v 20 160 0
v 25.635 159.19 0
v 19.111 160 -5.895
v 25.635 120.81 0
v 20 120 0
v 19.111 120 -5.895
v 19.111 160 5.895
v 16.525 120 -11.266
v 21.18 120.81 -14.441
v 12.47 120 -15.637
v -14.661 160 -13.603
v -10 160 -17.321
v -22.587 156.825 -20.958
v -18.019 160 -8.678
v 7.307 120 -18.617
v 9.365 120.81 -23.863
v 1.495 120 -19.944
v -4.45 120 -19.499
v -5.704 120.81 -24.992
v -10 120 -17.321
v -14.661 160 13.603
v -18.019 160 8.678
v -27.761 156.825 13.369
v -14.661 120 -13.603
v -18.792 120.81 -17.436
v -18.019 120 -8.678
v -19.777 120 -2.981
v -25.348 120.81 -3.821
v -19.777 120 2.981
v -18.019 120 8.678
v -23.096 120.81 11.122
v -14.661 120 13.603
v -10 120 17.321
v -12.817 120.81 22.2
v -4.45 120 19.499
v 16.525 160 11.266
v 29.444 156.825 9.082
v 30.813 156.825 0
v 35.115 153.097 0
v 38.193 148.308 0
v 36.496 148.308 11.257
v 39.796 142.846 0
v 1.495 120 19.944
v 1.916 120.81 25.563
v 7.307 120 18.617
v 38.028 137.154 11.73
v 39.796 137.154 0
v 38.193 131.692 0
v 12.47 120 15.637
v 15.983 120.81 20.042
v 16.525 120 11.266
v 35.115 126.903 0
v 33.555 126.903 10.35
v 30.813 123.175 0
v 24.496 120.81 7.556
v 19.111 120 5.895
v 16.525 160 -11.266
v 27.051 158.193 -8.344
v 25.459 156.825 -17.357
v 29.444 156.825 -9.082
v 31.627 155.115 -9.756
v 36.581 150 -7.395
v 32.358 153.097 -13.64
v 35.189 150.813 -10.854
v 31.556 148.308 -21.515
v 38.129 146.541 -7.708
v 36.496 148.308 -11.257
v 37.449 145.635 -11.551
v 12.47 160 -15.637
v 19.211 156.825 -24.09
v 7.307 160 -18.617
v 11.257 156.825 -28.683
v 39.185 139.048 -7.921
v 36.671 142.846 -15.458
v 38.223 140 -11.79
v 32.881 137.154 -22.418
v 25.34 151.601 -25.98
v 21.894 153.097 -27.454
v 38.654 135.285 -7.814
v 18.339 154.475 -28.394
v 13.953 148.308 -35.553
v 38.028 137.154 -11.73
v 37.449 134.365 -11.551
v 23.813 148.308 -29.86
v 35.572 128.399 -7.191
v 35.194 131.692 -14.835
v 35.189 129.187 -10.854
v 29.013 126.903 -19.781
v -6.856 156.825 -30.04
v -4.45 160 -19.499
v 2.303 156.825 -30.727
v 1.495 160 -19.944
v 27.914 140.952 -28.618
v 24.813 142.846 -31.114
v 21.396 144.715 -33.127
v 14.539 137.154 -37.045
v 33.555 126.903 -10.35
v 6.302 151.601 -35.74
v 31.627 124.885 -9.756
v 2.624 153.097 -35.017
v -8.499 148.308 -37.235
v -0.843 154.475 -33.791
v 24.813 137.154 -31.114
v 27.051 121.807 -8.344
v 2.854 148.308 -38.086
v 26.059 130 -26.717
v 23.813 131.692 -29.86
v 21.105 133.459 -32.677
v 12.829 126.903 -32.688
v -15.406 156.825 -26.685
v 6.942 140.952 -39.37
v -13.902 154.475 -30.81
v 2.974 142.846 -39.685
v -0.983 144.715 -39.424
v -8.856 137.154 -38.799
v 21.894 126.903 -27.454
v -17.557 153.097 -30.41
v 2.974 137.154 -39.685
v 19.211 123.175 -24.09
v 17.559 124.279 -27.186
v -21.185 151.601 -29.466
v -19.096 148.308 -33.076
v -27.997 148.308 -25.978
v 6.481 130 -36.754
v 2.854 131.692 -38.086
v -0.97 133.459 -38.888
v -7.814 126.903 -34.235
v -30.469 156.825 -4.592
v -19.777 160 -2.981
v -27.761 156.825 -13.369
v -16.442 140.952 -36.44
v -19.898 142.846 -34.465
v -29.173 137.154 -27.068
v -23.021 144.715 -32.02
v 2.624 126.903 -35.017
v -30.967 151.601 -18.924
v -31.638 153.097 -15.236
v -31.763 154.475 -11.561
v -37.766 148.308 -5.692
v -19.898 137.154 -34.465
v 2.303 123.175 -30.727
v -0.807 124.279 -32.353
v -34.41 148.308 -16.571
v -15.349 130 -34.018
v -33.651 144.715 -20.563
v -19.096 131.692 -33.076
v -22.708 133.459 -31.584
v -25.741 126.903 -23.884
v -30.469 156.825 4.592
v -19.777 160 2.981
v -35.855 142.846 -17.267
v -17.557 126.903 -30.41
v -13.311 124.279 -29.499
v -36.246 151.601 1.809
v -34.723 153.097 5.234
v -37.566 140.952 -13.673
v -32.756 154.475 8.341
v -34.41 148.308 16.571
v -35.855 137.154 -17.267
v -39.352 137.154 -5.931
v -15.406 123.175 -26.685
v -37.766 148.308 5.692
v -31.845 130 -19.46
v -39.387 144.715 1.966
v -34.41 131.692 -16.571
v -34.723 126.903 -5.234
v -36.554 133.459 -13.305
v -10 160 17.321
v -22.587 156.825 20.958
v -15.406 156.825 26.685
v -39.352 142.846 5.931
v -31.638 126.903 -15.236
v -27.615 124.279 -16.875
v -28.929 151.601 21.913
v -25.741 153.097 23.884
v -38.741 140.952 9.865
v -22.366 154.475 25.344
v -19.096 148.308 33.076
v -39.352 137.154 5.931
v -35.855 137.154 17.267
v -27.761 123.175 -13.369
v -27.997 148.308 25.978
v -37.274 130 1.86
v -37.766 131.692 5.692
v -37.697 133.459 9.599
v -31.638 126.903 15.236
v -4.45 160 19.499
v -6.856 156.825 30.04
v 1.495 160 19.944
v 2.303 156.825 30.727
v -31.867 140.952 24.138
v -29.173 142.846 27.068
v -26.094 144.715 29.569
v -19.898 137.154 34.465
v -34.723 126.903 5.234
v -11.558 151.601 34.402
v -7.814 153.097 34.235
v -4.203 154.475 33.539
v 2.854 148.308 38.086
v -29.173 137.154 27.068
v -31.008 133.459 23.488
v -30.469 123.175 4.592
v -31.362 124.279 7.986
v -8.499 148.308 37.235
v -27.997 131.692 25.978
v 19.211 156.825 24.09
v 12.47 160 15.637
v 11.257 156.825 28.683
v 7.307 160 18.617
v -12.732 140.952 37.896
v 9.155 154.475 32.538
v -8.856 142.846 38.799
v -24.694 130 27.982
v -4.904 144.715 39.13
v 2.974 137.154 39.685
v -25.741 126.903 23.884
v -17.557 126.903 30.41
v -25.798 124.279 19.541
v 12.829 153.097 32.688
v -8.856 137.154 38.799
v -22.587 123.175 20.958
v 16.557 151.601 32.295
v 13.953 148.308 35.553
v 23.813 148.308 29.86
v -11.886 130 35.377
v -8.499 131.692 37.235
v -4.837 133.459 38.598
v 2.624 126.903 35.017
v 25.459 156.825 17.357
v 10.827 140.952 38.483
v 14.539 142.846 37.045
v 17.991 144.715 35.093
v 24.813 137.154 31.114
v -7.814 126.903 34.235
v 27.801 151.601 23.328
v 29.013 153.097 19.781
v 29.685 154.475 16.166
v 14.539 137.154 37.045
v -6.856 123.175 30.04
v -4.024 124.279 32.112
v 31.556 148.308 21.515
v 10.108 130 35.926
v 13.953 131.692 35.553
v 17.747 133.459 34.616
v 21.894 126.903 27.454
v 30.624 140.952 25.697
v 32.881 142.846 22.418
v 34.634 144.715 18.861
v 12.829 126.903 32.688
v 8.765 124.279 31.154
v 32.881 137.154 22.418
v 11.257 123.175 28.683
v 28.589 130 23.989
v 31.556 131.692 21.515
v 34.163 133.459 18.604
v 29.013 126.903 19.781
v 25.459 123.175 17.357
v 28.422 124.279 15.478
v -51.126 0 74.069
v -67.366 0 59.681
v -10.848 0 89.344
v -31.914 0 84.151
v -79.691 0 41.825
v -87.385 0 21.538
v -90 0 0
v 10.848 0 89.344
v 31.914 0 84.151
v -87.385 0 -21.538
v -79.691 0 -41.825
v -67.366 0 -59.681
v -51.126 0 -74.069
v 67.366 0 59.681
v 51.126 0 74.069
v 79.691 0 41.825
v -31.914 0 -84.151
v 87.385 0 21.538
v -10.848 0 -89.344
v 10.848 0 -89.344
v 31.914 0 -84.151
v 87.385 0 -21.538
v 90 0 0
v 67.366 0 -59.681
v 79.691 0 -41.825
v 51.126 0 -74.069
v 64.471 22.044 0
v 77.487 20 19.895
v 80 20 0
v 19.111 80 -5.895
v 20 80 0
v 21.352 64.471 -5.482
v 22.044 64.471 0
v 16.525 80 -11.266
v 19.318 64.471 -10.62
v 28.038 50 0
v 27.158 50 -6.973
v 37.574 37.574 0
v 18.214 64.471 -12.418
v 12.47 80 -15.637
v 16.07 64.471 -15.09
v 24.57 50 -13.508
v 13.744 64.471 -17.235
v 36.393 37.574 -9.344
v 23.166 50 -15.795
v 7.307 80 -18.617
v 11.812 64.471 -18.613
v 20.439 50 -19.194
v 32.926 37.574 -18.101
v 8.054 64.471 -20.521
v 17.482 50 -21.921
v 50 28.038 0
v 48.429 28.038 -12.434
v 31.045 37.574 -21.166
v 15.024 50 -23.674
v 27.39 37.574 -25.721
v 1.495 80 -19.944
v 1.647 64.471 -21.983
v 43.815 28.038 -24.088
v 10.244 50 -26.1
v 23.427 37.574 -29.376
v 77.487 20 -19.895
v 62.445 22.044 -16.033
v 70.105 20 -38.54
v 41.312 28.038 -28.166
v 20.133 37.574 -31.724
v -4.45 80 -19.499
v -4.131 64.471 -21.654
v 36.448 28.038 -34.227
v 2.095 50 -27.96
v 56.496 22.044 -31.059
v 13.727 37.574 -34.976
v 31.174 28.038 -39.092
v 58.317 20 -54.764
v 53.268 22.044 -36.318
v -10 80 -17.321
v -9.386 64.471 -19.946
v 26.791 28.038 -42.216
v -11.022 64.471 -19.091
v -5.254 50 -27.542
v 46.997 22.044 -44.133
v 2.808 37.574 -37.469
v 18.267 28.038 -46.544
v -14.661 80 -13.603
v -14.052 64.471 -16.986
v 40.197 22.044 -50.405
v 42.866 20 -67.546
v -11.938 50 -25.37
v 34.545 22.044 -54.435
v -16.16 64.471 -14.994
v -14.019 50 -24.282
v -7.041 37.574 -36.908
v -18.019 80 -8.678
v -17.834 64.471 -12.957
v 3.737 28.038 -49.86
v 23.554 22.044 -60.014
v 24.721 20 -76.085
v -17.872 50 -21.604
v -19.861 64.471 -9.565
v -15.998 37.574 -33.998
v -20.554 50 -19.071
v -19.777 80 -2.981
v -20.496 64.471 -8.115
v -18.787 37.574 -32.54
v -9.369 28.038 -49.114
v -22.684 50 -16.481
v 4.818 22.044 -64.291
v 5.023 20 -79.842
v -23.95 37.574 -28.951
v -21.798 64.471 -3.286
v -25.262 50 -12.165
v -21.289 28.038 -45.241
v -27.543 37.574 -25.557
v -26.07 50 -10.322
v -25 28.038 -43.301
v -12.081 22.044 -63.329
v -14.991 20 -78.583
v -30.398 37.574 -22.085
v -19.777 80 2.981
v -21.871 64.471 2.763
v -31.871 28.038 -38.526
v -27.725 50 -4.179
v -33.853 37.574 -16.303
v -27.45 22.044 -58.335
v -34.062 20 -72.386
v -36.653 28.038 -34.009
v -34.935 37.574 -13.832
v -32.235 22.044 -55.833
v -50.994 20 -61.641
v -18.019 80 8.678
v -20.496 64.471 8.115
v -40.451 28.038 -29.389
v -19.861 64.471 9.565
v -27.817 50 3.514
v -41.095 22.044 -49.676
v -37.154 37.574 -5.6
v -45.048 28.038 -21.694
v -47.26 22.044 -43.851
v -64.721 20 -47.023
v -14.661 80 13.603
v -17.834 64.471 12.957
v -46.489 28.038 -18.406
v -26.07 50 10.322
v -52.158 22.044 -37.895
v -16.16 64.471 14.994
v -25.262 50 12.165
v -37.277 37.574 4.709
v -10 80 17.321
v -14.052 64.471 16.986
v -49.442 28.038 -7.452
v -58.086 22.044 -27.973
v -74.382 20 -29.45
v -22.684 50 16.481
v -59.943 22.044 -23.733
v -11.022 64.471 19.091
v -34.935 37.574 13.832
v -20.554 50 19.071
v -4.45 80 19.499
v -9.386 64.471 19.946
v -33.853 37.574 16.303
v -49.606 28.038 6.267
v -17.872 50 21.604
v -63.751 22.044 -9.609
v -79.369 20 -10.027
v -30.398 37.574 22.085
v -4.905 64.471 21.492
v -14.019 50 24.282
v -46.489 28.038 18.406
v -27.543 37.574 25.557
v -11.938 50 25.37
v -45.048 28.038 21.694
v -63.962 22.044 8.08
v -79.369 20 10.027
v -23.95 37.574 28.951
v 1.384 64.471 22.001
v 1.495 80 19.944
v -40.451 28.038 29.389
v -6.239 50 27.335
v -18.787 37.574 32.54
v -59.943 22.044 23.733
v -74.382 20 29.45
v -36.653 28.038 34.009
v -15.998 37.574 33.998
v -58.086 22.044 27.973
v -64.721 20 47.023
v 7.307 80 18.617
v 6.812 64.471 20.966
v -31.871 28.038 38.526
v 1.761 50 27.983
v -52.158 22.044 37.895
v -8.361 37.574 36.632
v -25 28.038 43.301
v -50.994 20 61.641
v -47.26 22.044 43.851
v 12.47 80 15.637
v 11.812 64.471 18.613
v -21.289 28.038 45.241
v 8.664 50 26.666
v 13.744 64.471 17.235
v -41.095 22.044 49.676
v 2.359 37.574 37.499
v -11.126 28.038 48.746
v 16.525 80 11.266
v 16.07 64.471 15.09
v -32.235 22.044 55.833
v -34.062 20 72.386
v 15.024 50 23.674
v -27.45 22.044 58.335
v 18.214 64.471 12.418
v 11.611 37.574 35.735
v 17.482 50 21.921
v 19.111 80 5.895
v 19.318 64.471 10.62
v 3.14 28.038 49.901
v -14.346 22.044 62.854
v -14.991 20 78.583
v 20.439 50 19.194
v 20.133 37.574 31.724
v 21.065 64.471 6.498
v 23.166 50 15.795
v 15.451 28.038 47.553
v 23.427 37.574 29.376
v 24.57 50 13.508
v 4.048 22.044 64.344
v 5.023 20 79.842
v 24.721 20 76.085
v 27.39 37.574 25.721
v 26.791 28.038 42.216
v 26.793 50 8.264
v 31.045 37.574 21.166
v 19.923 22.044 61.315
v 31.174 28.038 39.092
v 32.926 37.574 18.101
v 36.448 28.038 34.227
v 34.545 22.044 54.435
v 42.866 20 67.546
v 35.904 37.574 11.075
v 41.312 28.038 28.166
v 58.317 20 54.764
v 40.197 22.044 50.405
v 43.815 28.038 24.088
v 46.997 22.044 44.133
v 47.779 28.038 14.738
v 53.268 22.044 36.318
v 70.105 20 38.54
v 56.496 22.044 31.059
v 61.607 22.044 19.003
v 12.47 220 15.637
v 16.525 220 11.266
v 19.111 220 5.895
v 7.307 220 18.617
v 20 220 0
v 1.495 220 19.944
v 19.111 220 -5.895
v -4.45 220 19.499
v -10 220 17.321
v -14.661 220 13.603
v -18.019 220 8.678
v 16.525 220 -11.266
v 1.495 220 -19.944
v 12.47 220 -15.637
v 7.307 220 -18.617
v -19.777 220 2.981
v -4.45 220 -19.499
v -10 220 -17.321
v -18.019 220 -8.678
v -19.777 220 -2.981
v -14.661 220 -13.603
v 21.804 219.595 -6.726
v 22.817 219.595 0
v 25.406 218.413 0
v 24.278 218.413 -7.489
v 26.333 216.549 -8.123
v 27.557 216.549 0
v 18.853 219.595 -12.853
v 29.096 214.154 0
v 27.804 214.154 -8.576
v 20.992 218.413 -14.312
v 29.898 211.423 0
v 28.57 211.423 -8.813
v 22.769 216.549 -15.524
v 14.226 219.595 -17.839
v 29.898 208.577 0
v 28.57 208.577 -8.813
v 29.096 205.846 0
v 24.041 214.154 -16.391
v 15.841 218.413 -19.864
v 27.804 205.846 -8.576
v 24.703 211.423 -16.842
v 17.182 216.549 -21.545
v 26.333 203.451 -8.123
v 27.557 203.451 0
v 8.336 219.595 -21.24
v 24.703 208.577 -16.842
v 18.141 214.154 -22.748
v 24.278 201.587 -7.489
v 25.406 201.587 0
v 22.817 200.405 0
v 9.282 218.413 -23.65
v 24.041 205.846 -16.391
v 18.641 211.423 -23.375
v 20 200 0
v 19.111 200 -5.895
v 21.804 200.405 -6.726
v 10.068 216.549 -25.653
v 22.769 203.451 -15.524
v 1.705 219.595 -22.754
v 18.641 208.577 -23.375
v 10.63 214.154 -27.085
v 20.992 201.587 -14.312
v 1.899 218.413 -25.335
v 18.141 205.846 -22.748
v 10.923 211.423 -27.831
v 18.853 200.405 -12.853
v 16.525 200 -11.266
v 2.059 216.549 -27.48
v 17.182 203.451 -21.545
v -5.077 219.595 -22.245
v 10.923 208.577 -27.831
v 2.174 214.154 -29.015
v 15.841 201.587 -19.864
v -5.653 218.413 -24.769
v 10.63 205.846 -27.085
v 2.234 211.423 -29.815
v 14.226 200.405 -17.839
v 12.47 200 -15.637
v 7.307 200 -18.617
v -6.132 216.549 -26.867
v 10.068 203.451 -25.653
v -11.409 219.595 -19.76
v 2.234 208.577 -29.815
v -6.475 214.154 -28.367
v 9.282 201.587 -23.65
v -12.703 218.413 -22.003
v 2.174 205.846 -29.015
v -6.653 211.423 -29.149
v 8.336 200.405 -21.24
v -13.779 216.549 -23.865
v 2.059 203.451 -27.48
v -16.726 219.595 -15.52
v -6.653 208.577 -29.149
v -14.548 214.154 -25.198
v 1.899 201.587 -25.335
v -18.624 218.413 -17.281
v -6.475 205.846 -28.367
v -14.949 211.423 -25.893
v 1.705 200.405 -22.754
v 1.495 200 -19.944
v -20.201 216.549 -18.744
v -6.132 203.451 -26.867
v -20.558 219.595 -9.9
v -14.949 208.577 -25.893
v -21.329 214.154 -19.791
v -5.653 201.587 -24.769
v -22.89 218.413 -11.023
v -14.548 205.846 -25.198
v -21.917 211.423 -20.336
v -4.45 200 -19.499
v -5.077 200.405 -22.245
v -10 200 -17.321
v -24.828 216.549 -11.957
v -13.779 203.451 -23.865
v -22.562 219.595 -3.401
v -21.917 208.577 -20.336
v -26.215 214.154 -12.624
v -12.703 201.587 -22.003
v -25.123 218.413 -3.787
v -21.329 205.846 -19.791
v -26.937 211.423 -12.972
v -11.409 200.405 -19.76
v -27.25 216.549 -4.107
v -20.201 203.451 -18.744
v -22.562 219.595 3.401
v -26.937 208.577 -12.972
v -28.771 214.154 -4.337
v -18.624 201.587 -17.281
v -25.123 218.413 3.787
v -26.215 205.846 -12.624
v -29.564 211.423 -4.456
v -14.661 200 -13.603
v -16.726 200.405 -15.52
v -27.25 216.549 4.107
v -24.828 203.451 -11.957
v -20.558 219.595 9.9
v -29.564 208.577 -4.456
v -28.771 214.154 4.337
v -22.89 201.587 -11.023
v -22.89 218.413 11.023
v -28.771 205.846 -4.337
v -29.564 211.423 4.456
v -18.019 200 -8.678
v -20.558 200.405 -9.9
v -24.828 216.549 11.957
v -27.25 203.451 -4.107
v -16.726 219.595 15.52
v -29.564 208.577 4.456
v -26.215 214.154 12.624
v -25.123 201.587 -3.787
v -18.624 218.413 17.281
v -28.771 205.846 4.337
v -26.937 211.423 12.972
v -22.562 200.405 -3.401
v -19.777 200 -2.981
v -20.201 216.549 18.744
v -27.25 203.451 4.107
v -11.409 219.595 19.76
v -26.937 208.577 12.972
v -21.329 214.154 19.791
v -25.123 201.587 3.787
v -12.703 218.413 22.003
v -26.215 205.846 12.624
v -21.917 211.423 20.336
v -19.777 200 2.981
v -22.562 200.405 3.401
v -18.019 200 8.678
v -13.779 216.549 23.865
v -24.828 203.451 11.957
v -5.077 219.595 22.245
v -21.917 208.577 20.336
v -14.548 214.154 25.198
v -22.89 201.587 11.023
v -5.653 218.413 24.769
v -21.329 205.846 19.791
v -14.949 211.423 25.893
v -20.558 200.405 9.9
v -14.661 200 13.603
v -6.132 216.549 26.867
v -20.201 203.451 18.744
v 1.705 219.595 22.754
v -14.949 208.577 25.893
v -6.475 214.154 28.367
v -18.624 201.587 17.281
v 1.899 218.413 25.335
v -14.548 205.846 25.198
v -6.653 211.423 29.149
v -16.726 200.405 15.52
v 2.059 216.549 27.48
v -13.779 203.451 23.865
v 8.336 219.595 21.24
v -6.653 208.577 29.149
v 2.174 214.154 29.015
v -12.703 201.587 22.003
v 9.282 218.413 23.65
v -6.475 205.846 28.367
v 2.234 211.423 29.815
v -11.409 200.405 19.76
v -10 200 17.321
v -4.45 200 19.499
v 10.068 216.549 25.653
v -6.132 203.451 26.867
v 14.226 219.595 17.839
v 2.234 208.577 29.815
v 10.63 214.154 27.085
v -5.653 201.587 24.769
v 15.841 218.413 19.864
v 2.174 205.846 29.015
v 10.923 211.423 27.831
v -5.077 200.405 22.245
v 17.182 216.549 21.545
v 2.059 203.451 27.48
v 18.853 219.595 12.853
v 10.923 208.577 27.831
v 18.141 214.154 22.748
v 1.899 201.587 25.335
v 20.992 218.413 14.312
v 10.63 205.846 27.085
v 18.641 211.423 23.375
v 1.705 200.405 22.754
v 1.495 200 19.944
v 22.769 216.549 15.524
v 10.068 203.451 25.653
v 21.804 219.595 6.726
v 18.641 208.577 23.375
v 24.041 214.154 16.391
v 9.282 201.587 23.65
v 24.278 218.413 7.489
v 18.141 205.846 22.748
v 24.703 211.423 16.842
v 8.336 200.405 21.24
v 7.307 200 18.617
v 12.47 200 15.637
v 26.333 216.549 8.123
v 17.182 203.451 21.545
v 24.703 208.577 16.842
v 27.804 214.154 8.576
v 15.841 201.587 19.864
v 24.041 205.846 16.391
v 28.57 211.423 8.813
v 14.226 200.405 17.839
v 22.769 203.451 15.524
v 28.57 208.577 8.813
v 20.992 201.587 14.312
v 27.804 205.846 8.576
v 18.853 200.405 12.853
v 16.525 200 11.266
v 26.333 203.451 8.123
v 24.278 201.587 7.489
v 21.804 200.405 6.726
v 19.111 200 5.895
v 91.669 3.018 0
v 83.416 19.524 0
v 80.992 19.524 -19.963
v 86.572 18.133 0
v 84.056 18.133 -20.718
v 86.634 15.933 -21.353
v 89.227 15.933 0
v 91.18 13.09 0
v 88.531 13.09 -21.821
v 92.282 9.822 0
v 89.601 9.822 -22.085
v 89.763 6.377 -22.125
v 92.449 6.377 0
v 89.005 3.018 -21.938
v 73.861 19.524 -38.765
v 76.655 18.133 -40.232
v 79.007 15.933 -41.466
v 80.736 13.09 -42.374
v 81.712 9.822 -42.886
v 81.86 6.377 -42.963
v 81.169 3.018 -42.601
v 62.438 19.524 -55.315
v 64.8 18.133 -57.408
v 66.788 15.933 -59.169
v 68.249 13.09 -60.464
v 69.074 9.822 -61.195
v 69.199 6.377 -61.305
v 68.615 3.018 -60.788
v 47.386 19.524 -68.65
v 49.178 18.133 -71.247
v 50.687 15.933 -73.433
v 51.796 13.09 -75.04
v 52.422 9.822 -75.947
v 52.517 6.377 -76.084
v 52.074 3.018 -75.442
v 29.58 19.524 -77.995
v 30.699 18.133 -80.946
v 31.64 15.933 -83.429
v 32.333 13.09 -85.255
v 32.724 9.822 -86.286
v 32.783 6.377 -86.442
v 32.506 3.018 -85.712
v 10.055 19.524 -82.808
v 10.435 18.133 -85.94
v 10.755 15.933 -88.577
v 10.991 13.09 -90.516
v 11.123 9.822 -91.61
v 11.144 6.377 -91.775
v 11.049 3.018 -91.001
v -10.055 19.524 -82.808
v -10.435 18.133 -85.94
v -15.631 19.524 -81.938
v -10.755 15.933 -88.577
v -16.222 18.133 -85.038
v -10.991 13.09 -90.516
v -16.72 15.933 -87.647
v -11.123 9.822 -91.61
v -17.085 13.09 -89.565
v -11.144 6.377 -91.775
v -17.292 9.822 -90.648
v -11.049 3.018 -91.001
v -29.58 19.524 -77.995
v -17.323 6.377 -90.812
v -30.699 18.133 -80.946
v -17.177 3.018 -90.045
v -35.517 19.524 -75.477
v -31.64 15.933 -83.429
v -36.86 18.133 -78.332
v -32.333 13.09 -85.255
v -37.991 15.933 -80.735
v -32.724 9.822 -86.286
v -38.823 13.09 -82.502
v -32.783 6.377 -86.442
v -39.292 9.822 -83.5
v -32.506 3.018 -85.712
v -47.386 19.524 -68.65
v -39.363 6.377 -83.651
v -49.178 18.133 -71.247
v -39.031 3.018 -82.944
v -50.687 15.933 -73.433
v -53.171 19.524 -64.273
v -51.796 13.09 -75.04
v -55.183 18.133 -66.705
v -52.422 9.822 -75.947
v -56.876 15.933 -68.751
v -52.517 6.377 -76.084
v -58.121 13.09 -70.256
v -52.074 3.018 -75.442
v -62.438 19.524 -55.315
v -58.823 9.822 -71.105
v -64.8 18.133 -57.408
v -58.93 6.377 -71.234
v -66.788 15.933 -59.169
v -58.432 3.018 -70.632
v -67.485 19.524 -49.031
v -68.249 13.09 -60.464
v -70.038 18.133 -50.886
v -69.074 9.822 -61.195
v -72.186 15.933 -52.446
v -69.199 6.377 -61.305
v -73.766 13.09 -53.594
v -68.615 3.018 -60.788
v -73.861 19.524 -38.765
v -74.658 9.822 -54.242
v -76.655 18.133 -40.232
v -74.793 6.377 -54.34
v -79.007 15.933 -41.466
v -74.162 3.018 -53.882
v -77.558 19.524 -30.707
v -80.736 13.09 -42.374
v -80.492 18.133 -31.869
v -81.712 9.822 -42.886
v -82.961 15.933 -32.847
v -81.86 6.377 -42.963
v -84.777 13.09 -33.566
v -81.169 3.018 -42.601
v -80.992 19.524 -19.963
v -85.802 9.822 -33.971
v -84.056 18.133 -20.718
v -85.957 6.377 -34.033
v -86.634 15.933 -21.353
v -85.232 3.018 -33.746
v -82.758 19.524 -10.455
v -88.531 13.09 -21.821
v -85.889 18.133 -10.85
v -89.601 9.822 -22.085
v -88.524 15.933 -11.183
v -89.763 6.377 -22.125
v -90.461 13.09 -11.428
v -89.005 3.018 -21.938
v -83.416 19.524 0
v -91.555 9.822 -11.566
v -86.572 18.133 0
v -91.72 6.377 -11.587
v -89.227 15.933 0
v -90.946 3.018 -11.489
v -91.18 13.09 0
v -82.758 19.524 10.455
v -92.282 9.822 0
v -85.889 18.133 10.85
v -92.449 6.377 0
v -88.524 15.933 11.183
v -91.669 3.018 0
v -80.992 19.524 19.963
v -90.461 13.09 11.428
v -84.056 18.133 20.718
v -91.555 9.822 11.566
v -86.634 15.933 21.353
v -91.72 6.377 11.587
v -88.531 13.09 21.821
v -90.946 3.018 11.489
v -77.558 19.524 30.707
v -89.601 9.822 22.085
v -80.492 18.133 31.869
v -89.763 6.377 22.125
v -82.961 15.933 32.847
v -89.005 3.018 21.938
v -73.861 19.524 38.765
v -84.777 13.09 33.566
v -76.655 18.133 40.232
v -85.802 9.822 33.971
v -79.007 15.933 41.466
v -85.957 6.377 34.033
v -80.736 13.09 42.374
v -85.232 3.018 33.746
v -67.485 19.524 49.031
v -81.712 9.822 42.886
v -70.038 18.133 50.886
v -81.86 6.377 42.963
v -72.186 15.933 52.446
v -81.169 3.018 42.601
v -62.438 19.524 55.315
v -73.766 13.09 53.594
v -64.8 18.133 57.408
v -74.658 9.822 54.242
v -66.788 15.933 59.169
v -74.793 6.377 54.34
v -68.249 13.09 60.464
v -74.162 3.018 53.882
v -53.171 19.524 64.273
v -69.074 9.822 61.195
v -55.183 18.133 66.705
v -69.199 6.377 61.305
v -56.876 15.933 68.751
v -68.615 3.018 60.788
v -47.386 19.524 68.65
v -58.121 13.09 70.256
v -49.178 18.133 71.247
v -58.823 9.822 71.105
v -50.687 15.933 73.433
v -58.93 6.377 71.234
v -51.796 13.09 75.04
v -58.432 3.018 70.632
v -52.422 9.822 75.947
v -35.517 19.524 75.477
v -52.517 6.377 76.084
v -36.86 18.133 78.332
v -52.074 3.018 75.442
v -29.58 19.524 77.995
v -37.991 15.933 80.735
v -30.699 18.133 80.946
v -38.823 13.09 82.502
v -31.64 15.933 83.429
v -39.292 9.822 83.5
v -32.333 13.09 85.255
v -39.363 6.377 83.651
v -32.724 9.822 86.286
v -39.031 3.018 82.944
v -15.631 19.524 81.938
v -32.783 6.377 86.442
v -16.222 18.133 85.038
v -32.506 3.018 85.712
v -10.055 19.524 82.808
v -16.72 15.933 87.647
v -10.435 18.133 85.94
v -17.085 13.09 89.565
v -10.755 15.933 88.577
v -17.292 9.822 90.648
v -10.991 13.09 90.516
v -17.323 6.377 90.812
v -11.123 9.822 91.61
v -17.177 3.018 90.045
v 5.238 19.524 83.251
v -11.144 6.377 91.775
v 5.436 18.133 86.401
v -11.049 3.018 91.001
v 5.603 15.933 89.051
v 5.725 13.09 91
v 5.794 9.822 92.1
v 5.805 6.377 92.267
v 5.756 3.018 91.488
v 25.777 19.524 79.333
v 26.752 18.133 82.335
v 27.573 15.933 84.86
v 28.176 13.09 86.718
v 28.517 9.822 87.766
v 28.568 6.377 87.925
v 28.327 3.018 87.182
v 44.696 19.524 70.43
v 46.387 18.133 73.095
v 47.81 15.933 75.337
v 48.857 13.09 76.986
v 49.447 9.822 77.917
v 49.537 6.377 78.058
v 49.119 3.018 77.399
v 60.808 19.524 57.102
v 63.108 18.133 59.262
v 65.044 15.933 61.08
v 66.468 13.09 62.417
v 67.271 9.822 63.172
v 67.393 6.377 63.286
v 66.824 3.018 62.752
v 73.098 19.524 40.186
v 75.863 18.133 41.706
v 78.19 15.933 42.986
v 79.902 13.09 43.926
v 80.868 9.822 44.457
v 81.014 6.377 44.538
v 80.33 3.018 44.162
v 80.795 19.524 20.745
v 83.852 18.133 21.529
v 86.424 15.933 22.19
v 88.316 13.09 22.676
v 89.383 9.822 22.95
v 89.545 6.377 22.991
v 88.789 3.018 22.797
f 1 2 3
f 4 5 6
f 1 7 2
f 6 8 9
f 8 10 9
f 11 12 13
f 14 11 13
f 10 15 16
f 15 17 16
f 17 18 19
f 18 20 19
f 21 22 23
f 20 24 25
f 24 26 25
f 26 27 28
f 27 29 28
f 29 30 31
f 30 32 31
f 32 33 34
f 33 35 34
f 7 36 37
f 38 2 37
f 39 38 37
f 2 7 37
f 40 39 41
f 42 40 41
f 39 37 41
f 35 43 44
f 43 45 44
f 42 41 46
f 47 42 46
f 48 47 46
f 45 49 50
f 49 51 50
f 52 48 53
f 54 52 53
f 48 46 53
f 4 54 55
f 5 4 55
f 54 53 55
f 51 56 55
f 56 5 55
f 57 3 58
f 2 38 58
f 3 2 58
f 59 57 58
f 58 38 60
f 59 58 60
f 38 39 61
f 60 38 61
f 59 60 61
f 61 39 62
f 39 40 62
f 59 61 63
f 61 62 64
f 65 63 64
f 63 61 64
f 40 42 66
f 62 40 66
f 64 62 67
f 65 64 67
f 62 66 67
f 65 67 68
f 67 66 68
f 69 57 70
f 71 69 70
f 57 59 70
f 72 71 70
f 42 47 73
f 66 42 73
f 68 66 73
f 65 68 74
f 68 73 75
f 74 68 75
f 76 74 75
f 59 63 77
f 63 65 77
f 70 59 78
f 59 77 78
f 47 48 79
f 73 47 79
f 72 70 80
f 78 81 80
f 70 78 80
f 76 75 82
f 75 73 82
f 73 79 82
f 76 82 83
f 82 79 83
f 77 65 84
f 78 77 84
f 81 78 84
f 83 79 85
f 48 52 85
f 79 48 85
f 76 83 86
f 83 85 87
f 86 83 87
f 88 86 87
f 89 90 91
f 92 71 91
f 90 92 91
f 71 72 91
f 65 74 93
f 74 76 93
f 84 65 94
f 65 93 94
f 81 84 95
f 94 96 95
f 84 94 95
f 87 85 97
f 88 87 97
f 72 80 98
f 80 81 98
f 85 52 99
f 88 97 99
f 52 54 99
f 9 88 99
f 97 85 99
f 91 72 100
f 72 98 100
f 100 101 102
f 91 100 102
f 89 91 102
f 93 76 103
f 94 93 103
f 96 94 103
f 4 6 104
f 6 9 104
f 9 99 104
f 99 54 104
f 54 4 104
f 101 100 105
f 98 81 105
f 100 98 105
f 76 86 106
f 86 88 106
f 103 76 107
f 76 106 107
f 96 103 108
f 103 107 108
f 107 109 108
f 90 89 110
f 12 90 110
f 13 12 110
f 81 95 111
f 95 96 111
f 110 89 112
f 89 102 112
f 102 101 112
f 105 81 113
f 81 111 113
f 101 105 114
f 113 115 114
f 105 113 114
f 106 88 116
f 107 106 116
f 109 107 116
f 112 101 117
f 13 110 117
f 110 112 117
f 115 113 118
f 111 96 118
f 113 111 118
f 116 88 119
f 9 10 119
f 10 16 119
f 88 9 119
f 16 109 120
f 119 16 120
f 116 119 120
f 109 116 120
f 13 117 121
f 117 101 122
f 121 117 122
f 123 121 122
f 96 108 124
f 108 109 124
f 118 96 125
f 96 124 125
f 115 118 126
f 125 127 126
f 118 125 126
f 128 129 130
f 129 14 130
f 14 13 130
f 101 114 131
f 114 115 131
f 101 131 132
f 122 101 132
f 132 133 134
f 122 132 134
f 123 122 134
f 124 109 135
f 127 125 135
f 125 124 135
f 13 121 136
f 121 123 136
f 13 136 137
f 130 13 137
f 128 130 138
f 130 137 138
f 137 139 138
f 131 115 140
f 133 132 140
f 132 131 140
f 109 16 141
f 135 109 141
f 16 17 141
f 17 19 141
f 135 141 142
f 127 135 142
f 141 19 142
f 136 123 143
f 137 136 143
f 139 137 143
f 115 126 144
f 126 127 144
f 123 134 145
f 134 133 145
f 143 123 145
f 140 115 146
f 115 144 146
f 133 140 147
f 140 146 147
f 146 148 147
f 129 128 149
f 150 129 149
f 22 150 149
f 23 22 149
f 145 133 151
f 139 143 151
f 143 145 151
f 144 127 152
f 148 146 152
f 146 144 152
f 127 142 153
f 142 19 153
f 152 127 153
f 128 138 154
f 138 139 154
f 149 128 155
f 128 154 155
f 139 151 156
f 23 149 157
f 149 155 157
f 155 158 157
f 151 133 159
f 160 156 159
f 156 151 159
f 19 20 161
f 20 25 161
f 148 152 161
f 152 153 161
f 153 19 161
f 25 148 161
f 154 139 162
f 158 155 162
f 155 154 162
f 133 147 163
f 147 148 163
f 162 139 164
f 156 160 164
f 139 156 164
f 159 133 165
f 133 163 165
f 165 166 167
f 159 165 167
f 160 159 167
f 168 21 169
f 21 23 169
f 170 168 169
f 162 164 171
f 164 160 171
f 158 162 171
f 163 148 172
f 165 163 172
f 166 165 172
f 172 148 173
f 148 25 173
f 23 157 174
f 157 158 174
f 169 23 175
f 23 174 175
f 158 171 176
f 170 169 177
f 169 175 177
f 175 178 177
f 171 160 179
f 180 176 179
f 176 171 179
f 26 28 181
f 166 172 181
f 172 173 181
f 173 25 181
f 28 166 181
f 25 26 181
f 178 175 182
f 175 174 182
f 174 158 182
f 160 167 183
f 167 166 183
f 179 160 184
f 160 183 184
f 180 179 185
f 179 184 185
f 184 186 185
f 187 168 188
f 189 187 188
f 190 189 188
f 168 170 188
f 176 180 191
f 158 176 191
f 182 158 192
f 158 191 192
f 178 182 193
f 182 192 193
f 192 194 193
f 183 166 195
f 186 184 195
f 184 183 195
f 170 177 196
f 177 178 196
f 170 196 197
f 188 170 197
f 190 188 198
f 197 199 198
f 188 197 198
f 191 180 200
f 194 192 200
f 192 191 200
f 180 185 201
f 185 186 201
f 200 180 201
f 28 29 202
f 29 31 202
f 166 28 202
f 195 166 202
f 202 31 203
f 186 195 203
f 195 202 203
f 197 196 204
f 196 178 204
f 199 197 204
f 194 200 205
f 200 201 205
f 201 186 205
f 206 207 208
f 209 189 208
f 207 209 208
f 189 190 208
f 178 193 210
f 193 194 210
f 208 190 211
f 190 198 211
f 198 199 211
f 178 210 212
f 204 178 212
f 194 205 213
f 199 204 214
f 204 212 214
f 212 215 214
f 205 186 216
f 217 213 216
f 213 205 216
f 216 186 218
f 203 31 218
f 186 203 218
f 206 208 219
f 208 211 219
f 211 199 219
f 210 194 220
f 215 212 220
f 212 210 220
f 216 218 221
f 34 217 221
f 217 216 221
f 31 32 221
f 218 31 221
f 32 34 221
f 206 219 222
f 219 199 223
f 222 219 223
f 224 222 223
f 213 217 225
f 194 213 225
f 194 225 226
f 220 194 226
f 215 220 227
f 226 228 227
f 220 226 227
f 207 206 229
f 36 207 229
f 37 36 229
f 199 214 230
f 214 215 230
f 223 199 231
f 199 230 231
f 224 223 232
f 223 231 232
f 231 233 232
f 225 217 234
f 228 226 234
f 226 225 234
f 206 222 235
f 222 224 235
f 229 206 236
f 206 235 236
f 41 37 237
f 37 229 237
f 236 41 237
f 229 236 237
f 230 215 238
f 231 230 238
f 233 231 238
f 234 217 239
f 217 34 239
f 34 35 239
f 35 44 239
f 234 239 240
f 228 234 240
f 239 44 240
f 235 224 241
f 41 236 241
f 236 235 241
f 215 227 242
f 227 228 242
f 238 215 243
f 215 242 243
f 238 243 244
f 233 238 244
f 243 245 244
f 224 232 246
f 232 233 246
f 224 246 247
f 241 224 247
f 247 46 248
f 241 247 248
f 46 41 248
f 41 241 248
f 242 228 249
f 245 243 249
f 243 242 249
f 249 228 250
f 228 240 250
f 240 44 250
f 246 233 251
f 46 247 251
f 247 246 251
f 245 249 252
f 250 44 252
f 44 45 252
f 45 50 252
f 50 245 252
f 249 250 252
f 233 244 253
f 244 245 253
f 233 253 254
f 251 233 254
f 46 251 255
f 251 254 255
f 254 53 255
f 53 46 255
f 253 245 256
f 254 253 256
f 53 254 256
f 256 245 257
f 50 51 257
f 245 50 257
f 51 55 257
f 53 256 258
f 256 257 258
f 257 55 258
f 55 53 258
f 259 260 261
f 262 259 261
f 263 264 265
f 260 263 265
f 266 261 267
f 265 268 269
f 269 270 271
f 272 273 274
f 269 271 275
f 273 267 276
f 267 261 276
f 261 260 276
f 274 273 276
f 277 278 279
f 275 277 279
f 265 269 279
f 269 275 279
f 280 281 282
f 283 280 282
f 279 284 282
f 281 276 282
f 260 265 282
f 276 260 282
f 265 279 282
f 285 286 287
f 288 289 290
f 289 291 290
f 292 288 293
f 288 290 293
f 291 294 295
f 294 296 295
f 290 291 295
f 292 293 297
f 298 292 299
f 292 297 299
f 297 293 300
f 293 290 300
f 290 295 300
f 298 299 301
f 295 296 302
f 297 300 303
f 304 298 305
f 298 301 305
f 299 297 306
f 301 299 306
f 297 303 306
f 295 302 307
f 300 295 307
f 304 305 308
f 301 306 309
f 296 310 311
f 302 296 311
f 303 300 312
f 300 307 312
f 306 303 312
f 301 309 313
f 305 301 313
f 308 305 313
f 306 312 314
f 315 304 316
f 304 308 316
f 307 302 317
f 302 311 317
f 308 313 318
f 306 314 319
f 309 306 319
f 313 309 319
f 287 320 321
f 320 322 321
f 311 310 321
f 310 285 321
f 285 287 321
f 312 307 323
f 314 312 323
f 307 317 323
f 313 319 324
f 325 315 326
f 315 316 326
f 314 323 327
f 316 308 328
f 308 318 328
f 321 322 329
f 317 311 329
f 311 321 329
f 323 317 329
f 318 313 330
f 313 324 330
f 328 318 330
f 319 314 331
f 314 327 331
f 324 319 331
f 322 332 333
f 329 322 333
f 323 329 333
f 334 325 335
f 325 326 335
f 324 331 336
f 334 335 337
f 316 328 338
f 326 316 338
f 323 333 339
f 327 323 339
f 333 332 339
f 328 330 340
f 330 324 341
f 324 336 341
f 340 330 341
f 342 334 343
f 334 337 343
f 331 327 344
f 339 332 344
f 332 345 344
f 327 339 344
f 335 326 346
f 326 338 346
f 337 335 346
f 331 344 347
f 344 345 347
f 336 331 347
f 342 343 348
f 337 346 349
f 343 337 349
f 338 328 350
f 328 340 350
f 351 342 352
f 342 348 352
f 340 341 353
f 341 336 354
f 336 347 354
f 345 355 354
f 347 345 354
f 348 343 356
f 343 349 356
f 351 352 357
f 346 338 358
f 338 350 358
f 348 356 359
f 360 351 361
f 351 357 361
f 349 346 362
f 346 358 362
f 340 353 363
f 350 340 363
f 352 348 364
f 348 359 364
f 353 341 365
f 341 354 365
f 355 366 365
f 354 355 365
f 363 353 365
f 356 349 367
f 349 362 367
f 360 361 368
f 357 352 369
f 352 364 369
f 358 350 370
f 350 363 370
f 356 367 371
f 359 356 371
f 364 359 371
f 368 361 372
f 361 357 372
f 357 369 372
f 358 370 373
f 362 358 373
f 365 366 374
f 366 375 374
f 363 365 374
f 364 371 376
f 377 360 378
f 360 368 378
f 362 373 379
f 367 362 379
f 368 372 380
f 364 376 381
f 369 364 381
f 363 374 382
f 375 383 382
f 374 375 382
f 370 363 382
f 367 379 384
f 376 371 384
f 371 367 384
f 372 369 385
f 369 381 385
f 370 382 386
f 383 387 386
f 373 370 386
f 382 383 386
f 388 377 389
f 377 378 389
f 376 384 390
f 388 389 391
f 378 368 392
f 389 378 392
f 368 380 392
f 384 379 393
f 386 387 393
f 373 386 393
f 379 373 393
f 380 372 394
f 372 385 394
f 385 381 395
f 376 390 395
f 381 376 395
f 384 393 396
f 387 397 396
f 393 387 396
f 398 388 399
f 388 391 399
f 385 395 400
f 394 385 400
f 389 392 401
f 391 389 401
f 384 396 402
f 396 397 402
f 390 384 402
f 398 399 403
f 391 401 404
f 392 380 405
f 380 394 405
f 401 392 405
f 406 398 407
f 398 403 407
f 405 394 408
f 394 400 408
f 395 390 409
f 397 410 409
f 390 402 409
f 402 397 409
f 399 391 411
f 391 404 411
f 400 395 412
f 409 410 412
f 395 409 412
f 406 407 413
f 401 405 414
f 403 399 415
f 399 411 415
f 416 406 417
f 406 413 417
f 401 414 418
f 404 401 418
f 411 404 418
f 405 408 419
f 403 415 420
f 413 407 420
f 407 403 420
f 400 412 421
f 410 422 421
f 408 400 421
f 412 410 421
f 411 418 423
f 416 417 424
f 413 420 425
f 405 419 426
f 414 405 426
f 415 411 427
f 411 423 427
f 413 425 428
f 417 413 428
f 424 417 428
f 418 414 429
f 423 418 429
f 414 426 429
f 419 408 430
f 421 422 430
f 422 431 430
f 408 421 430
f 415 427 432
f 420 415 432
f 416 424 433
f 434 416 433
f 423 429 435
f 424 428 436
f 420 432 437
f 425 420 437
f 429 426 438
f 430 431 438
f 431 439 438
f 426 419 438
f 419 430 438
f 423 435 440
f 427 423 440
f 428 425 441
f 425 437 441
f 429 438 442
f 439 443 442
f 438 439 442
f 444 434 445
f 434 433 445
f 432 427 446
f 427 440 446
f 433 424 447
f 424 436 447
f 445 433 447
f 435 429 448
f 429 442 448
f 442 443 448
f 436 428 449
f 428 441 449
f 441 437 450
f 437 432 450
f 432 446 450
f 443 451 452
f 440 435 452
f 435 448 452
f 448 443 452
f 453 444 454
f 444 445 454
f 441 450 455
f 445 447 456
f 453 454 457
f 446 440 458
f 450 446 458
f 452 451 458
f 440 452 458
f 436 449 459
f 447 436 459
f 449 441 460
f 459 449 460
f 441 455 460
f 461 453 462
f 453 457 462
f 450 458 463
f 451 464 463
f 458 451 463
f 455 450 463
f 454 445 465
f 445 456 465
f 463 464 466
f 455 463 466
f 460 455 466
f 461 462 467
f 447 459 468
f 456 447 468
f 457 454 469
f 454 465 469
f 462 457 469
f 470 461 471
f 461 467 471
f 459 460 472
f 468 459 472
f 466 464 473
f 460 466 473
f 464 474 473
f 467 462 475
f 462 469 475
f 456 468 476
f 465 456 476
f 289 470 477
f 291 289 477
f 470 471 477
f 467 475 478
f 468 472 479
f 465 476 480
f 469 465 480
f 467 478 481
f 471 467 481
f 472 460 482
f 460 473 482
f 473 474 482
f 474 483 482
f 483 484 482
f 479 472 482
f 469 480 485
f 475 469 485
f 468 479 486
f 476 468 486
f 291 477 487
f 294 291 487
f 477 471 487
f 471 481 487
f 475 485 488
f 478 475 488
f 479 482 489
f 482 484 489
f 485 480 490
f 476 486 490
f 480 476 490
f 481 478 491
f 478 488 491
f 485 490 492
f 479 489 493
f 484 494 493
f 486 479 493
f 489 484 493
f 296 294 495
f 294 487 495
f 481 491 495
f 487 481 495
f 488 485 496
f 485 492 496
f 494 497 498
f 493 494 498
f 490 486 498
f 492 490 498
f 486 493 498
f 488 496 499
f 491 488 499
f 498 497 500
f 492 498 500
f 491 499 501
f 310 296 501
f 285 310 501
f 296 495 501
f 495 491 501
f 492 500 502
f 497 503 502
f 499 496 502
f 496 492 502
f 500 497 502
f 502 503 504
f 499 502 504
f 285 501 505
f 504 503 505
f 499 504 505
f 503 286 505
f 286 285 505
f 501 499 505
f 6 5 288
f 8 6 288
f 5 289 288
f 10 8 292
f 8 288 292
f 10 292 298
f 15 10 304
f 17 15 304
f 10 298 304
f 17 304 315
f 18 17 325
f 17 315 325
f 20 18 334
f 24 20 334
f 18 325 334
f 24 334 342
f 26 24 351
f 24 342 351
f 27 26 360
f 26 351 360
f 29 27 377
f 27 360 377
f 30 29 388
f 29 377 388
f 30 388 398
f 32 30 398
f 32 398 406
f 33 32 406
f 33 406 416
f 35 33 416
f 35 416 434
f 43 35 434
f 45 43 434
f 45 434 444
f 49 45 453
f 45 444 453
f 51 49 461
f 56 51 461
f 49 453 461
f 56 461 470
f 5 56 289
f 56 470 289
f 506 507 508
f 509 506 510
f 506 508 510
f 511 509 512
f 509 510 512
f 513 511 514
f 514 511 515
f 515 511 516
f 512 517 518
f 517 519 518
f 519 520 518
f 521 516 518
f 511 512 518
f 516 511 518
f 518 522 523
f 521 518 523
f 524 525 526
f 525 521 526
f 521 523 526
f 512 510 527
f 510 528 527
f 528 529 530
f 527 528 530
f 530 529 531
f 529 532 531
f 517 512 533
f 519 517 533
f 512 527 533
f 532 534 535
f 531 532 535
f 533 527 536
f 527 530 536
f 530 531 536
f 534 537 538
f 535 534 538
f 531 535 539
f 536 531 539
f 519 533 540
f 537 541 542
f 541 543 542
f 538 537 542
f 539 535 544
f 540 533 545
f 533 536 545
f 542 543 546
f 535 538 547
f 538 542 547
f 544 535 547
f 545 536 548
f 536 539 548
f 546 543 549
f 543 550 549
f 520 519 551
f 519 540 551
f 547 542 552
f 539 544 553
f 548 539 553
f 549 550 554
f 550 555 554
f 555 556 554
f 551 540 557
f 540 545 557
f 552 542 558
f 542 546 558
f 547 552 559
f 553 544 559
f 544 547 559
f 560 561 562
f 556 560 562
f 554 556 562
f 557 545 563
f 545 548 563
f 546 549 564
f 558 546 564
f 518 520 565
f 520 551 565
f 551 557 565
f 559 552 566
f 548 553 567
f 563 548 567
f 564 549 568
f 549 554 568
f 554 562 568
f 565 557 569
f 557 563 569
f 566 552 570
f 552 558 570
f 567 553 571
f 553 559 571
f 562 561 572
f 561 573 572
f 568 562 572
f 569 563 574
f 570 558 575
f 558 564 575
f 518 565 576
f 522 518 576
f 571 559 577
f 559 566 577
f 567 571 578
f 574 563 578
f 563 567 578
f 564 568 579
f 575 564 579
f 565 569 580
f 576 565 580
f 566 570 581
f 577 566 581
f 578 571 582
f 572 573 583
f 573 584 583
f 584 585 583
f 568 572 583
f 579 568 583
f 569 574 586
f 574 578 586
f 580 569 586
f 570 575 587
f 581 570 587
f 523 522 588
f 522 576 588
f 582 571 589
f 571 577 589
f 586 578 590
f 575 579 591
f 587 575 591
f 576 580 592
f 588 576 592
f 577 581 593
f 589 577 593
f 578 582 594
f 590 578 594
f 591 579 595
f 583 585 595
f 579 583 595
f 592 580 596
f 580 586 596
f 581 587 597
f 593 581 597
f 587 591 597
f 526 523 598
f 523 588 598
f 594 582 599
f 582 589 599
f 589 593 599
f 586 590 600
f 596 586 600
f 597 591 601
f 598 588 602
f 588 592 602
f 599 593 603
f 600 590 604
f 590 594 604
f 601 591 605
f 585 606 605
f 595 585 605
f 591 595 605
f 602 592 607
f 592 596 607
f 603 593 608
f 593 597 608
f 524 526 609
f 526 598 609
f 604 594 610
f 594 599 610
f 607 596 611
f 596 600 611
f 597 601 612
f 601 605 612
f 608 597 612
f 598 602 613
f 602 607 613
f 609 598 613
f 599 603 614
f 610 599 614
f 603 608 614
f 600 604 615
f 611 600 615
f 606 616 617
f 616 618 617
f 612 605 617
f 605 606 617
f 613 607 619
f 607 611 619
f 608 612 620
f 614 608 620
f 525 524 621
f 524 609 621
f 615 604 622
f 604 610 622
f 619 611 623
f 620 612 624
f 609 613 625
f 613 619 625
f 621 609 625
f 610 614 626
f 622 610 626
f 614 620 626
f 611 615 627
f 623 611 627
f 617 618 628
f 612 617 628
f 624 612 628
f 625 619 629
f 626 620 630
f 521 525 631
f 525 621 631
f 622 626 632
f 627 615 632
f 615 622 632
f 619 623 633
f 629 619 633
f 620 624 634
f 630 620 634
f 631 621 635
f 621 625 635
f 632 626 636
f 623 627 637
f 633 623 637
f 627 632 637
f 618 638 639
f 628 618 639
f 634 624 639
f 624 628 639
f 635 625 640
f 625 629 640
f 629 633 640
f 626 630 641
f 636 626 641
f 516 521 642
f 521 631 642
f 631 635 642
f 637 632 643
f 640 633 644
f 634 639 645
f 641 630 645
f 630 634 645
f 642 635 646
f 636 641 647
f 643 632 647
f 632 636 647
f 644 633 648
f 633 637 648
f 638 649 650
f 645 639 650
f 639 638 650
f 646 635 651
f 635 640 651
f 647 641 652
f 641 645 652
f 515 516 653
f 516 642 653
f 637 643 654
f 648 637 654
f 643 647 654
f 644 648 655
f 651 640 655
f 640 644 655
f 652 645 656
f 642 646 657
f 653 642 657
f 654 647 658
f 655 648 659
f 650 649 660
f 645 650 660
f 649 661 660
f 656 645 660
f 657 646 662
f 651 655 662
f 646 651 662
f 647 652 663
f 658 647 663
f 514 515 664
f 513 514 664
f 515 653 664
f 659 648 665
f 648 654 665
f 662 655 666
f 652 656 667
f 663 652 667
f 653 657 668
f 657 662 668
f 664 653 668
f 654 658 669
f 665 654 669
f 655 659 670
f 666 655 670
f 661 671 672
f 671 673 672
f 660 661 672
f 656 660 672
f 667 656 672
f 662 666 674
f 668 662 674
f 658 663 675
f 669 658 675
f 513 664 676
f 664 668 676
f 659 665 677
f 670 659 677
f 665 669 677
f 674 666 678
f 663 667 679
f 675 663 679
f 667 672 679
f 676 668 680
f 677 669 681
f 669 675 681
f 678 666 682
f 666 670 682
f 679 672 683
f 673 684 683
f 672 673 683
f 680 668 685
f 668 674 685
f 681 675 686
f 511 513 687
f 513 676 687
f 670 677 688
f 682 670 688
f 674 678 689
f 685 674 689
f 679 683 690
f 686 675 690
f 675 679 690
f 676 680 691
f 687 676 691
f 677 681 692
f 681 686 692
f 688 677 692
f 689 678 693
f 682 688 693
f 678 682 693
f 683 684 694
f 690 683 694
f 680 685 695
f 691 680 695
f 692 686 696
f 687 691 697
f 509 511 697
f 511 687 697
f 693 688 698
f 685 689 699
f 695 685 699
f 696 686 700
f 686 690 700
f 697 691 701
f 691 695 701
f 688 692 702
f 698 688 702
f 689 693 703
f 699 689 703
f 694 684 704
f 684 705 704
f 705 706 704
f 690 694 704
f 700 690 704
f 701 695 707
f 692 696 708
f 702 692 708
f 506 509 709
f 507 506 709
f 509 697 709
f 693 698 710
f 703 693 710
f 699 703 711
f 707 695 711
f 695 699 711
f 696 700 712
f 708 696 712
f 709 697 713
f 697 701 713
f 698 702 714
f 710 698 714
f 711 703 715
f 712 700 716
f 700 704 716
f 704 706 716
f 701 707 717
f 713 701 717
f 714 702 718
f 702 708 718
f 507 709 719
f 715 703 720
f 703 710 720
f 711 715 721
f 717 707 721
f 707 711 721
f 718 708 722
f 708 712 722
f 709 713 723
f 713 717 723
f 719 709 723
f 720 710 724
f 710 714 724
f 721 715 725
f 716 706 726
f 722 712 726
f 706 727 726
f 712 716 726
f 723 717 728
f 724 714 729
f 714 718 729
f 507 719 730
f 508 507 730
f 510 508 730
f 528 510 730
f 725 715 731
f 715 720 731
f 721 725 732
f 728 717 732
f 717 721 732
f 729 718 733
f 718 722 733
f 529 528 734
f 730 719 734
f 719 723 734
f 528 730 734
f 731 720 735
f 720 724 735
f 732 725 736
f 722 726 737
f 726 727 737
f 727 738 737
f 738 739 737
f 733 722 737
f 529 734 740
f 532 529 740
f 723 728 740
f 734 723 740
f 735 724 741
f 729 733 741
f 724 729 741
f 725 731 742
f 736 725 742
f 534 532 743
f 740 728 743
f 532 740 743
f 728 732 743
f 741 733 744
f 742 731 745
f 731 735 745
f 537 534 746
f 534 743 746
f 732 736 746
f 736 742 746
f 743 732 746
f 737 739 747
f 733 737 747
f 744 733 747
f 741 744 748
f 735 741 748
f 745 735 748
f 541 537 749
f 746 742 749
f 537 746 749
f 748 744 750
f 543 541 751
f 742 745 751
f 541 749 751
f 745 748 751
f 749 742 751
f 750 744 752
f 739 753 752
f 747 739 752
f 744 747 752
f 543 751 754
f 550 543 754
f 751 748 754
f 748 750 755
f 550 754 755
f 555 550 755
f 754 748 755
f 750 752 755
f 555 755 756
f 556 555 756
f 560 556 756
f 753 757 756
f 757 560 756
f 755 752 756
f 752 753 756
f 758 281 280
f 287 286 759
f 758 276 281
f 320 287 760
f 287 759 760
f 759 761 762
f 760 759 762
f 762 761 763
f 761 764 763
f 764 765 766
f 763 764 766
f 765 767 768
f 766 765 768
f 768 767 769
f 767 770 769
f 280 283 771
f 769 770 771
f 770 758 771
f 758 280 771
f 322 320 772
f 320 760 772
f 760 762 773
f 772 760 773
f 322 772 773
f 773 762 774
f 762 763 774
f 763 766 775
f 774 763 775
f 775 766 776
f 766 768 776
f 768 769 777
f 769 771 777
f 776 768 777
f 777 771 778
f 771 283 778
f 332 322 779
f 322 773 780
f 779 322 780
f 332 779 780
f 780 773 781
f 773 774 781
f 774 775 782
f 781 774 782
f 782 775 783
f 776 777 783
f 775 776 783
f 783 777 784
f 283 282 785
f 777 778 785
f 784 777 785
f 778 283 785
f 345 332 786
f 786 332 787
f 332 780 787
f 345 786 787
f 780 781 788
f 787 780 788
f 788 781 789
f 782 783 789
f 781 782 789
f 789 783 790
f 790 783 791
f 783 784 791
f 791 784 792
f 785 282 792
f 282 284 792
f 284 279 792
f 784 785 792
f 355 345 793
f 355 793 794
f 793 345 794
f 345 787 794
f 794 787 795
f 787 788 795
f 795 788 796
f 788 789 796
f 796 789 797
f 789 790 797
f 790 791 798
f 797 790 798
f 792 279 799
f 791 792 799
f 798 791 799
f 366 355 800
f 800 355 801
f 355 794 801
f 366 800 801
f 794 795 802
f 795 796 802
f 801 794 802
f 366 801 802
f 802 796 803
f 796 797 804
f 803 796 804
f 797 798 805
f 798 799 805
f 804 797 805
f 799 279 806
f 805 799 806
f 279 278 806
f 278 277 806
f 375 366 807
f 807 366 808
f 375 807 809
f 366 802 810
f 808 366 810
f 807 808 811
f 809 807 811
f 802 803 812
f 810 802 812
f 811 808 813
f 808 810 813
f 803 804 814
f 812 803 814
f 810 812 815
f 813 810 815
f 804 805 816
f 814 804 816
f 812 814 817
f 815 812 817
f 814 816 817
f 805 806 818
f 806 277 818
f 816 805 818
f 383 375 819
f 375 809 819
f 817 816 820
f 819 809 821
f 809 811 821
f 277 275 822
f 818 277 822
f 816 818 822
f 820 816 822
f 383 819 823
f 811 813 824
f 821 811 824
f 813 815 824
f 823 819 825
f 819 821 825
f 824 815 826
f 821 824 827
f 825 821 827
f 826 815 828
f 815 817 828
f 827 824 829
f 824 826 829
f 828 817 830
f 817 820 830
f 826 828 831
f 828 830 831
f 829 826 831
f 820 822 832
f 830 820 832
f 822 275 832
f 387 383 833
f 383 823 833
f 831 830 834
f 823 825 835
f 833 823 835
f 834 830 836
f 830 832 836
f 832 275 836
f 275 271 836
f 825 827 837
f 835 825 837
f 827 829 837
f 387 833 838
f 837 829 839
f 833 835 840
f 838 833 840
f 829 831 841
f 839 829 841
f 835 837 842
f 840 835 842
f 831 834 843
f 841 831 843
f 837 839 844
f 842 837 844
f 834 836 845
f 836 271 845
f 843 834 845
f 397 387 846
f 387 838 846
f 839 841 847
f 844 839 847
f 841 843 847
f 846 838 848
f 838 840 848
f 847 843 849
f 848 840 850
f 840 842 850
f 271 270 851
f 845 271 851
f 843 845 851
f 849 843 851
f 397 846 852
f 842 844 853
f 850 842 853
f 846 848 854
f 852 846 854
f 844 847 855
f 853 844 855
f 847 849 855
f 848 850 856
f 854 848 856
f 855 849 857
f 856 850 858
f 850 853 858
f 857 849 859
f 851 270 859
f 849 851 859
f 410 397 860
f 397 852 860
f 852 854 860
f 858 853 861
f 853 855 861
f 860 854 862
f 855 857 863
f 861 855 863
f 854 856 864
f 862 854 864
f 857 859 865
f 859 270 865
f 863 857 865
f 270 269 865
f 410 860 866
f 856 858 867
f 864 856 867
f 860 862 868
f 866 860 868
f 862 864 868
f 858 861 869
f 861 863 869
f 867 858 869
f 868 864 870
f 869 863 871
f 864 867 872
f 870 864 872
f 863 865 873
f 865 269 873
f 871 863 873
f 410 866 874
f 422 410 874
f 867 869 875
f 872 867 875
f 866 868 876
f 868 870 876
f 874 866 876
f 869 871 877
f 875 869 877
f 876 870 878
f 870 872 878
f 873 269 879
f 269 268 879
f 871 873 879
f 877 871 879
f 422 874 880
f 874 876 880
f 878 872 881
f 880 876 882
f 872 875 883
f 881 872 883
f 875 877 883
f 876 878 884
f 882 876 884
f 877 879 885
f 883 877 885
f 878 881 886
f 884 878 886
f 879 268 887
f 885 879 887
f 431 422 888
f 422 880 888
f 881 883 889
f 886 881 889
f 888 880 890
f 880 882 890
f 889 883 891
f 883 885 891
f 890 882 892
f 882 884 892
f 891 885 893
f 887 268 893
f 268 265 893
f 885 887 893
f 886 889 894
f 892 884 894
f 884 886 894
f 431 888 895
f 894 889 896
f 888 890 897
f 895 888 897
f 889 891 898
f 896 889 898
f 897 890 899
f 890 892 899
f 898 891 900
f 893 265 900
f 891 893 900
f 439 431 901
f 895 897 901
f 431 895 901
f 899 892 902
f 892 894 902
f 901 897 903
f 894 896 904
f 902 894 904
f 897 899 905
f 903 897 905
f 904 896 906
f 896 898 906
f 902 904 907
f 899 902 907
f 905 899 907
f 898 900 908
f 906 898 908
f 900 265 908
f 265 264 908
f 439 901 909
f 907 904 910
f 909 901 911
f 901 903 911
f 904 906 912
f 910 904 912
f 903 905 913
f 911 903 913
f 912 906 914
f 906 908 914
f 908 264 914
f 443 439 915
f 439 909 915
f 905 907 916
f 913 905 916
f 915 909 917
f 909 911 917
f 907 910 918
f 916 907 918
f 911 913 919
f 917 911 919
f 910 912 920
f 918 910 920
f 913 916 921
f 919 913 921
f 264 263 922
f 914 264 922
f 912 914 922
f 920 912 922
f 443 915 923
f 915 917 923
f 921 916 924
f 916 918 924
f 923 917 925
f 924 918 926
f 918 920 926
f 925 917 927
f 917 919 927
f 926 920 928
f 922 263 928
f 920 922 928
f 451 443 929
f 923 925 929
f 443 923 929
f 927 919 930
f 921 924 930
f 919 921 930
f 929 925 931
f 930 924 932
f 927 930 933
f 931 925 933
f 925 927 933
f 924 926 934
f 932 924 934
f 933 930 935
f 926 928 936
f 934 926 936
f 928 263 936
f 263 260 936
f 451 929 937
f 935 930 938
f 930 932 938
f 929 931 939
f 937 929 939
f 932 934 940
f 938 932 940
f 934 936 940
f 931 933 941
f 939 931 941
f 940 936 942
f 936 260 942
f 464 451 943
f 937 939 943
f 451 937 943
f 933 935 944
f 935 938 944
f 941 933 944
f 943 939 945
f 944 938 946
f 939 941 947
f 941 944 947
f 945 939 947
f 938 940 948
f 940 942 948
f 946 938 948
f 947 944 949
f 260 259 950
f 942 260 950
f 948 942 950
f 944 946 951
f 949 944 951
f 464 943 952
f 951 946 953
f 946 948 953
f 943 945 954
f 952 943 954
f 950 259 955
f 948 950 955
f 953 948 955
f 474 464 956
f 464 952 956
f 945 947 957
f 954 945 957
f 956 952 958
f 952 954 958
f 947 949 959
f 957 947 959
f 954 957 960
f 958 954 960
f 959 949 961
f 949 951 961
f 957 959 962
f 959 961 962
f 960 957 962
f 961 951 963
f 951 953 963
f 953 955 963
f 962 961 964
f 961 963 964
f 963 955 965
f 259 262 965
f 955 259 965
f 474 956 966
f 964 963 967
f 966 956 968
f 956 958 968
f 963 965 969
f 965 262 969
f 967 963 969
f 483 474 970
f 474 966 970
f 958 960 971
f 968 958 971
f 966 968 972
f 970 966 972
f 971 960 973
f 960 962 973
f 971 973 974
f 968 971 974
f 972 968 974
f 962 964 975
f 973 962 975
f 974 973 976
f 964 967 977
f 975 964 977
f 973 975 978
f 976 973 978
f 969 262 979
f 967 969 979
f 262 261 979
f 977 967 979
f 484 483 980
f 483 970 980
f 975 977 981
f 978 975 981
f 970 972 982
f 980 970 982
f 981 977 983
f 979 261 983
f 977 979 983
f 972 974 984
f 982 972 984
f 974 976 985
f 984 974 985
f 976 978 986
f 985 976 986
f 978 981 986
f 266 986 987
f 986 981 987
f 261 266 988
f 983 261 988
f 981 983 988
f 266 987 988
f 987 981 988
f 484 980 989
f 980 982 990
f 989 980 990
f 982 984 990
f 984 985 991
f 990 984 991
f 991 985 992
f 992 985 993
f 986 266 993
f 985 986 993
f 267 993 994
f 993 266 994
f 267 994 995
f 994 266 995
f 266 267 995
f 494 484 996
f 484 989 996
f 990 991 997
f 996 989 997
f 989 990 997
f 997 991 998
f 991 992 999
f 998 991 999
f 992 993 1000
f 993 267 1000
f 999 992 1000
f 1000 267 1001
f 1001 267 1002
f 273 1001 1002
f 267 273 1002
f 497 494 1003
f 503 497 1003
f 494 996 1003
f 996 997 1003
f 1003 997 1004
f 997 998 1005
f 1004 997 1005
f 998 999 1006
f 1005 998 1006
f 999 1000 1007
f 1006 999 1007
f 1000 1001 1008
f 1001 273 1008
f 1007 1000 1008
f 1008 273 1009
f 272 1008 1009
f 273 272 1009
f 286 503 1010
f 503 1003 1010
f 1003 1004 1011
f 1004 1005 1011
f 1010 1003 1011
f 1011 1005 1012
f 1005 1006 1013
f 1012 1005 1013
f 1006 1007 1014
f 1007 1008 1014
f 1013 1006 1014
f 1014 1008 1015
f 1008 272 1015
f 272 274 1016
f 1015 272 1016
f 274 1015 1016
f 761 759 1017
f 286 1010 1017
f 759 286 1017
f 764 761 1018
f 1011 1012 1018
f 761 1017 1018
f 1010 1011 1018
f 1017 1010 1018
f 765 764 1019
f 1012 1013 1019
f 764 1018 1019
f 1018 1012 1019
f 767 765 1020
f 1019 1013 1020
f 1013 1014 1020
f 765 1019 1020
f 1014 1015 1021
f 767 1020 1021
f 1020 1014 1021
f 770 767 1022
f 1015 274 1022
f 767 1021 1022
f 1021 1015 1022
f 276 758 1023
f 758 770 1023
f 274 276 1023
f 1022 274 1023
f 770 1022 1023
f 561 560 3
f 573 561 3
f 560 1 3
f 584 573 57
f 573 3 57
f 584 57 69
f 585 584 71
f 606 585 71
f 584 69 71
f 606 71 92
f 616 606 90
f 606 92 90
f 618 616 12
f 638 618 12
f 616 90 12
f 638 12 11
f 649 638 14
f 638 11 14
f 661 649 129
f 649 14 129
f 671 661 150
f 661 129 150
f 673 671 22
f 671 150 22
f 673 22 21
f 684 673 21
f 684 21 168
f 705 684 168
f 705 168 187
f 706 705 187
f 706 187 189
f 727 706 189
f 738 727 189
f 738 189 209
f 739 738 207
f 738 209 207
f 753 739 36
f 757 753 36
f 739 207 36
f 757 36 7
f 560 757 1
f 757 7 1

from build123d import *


with BuildPart() as part:
    # Sketch2 → Revolve1 (revolve)
    with BuildSketch(Plane.XY):
        with BuildLine():
            Line((0, 0), (0, 220))
            Line((0, 220), (20, 220))
            ThreePointArc((20, 220), (30, 210), (20, 200))
            Line((20, 200), (20, 160))
            ThreePointArc((20, 160), (40, 140), (20, 120))
            Line((20, 120), (20, 80))
            ThreePointArc((20, 80), (37.573593129, 37.573593129), (80, 20))
            ThreePointArc((80, 20), (91.180339887, 13.090169944), (90, 0))
            Line((90, 0), (0, 0))
        make_face()
    revolve(axis=Axis((0, 0, 0), (0, 1, 0)))


solid = part.part
